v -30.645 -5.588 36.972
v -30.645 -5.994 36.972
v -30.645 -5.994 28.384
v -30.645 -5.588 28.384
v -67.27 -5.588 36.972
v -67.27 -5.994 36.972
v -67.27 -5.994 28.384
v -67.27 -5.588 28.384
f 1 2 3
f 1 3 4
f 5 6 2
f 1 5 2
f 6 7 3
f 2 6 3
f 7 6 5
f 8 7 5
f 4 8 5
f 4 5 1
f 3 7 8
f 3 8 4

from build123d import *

# Parameters (mm, degrees)
F0_W           = 50.8
F0_H           = 20.442858261
F1_DEPTH       = 1.4224
F2_W           = 59.6624054015
F2_H           = 15.4937258922
F2_W_2         = 57.630572468
F2_H_2         = 13.3588104509
F3_DEPTH       = 25.4
F6_W           = 36.6247072816
F6_H           = 14.4294630736
F7_DEPTH       = 3.81
F8_DEPTH       = 10.414
F9_W           = 36.6247072816
F9_H           = 14.224
F10_DEPTH      = 5.08
F10_DEPTH_BACK = 25.4
F11_DEPTH      = 6.096
F12_DEPTH      = 3.81
F13_DEPTH      = 9.144
F14_DEPTH      = 8.382
F15_DEPTH      = 4.318
F16_DEPTH      = 5.08
F17_DEPTH      = 2.032
F18_DEPTH      = 5.334
F19_DEPTH      = 3.302
F20_DEPTH      = 1.0414
F21_DEPTH      = 1.0922


with BuildPart() as f1:
    # F0 (on Front) → F1 (new body)
    with BuildSketch(Plane.XZ):
        with Locations((-71.1733810604, 46.5210825205)):
            Rectangle(F0_W, F0_H)
    extrude(amount=F1_DEPTH)


with BuildPart() as f3:
    # F2 (on Front) → F3 (new body)
    with BuildSketch(Plane.XZ):
        with Locations((-81.8801727146, 13.2793516386)):
            Rectangle(F2_W, F2_H)
        with Locations((-81.9890405983, 13.377974974)):
            Rectangle(F2_W_2, F2_H_2, mode=Mode.SUBTRACT)
    extrude(amount=F3_DEPTH)


with BuildPart() as f7:
    # F6 (on Front) → F7 (new body)
    with BuildSketch(Plane.XZ):
        with Locations((-48.9577911794, 35.5990426615)):
            Rectangle(F6_W, F6_H)
    extrude(amount=F7_DEPTH)

    # F8 (add): a face of the model
    f8_faces = [f7.faces().sort_by_distance(p)[0] for p in [
        (-48.9577911794, -3.81, 35.5990426615),
    ]]
    extrude(f8_faces, amount=F8_DEPTH)

    # F9 (on face) → F10 (cut, two sides)
    with BuildSketch(Plane.XY.offset(42.8137741983)) as f10_sk:
        with Locations((-48.9577911794, -7.112)):
            Rectangle(F9_W, F9_H)
    extrude(amount=-F10_DEPTH, mode=Mode.SUBTRACT)
    extrude(f10_sk.sketch, amount=F10_DEPTH_BACK, mode=Mode.SUBTRACT)

    # F11 (cut): a face of the model
    f11_faces = [f7.faces().sort_by_distance(p)[0] for p in [
        (-48.9577911794, -14.224, 33.0590426615),
    ]]
    extrude(f11_faces, amount=-F11_DEPTH, mode=Mode.SUBTRACT)

    # F12 (cut): a face of the model
    f12_faces = [f7.faces().sort_by_distance(p)[0] for p in [
        (-48.9577911794, -4.064, 37.7337741983),
    ]]
    extrude(f12_faces, amount=-F12_DEPTH, mode=Mode.SUBTRACT)

    # F13 (add): a face of the model
    f13_faces = [f7.faces().sort_by_distance(p)[0] for p in [
        (-48.9577911794, 0, 31.1540426615),
    ]]
    extrude(f13_faces, amount=F13_DEPTH)

    # F14 (add): a face of the model
    f14_faces = [f7.faces().sort_by_distance(p)[0] for p in [
        (-48.9577911794, 0.508, 33.9237741983),
    ]]
    extrude(f14_faces, amount=F14_DEPTH)

    # F15 (cut): a face of the model
    f15_faces = [f7.faces().sort_by_distance(p)[0] for p in [
        (-48.9577911794, 9.144, 35.3450426615),
    ]]
    extrude(f15_faces, amount=-F15_DEPTH, mode=Mode.SUBTRACT)

    # F16 (cut): a face of the model
    f16_faces = [f7.faces().sort_by_distance(p)[0] for p in [
        (-48.9577911794, 4.826, 35.3450426615),
    ]]
    extrude(f16_faces, amount=-F16_DEPTH, mode=Mode.SUBTRACT)

    # F17 (cut): a face of the model
    f17_faces = [f7.faces().sort_by_distance(p)[0] for p in [
        (-48.9577911794, -0.254, 35.3450426615),
    ]]
    extrude(f17_faces, amount=-F17_DEPTH, mode=Mode.SUBTRACT)

    # F18 (cut): a face of the model
    f18_faces = [f7.faces().sort_by_distance(p)[0] for p in [
        (-48.9577911794, -5.207, 42.3057741983),
    ]]
    extrude(f18_faces, amount=-F18_DEPTH, mode=Mode.SUBTRACT)

    # F19 (cut): a face of the model
    f19_faces = [f7.faces().sort_by_distance(p)[0] for p in [
        (-48.9577911794, -2.286, 32.6780426615),
    ]]
    extrude(f19_faces, amount=-F19_DEPTH, mode=Mode.SUBTRACT)

    # F20 (cut): a face of the model
    f20_faces = [f7.faces().sort_by_distance(p)[0] for p in [
        (-48.9577911794, -8.128, 32.6780426615),
    ]]
    extrude(f20_faces, amount=-F20_DEPTH, mode=Mode.SUBTRACT)

    # F21 (cut): a face of the model
    f21_faces = [f7.faces().sort_by_distance(p)[0] for p in [
        (-48.9577911794, -7.0866, 32.6780426615),
    ]]
    extrude(f21_faces, amount=-F21_DEPTH, mode=Mode.SUBTRACT)


solid = f7.part
